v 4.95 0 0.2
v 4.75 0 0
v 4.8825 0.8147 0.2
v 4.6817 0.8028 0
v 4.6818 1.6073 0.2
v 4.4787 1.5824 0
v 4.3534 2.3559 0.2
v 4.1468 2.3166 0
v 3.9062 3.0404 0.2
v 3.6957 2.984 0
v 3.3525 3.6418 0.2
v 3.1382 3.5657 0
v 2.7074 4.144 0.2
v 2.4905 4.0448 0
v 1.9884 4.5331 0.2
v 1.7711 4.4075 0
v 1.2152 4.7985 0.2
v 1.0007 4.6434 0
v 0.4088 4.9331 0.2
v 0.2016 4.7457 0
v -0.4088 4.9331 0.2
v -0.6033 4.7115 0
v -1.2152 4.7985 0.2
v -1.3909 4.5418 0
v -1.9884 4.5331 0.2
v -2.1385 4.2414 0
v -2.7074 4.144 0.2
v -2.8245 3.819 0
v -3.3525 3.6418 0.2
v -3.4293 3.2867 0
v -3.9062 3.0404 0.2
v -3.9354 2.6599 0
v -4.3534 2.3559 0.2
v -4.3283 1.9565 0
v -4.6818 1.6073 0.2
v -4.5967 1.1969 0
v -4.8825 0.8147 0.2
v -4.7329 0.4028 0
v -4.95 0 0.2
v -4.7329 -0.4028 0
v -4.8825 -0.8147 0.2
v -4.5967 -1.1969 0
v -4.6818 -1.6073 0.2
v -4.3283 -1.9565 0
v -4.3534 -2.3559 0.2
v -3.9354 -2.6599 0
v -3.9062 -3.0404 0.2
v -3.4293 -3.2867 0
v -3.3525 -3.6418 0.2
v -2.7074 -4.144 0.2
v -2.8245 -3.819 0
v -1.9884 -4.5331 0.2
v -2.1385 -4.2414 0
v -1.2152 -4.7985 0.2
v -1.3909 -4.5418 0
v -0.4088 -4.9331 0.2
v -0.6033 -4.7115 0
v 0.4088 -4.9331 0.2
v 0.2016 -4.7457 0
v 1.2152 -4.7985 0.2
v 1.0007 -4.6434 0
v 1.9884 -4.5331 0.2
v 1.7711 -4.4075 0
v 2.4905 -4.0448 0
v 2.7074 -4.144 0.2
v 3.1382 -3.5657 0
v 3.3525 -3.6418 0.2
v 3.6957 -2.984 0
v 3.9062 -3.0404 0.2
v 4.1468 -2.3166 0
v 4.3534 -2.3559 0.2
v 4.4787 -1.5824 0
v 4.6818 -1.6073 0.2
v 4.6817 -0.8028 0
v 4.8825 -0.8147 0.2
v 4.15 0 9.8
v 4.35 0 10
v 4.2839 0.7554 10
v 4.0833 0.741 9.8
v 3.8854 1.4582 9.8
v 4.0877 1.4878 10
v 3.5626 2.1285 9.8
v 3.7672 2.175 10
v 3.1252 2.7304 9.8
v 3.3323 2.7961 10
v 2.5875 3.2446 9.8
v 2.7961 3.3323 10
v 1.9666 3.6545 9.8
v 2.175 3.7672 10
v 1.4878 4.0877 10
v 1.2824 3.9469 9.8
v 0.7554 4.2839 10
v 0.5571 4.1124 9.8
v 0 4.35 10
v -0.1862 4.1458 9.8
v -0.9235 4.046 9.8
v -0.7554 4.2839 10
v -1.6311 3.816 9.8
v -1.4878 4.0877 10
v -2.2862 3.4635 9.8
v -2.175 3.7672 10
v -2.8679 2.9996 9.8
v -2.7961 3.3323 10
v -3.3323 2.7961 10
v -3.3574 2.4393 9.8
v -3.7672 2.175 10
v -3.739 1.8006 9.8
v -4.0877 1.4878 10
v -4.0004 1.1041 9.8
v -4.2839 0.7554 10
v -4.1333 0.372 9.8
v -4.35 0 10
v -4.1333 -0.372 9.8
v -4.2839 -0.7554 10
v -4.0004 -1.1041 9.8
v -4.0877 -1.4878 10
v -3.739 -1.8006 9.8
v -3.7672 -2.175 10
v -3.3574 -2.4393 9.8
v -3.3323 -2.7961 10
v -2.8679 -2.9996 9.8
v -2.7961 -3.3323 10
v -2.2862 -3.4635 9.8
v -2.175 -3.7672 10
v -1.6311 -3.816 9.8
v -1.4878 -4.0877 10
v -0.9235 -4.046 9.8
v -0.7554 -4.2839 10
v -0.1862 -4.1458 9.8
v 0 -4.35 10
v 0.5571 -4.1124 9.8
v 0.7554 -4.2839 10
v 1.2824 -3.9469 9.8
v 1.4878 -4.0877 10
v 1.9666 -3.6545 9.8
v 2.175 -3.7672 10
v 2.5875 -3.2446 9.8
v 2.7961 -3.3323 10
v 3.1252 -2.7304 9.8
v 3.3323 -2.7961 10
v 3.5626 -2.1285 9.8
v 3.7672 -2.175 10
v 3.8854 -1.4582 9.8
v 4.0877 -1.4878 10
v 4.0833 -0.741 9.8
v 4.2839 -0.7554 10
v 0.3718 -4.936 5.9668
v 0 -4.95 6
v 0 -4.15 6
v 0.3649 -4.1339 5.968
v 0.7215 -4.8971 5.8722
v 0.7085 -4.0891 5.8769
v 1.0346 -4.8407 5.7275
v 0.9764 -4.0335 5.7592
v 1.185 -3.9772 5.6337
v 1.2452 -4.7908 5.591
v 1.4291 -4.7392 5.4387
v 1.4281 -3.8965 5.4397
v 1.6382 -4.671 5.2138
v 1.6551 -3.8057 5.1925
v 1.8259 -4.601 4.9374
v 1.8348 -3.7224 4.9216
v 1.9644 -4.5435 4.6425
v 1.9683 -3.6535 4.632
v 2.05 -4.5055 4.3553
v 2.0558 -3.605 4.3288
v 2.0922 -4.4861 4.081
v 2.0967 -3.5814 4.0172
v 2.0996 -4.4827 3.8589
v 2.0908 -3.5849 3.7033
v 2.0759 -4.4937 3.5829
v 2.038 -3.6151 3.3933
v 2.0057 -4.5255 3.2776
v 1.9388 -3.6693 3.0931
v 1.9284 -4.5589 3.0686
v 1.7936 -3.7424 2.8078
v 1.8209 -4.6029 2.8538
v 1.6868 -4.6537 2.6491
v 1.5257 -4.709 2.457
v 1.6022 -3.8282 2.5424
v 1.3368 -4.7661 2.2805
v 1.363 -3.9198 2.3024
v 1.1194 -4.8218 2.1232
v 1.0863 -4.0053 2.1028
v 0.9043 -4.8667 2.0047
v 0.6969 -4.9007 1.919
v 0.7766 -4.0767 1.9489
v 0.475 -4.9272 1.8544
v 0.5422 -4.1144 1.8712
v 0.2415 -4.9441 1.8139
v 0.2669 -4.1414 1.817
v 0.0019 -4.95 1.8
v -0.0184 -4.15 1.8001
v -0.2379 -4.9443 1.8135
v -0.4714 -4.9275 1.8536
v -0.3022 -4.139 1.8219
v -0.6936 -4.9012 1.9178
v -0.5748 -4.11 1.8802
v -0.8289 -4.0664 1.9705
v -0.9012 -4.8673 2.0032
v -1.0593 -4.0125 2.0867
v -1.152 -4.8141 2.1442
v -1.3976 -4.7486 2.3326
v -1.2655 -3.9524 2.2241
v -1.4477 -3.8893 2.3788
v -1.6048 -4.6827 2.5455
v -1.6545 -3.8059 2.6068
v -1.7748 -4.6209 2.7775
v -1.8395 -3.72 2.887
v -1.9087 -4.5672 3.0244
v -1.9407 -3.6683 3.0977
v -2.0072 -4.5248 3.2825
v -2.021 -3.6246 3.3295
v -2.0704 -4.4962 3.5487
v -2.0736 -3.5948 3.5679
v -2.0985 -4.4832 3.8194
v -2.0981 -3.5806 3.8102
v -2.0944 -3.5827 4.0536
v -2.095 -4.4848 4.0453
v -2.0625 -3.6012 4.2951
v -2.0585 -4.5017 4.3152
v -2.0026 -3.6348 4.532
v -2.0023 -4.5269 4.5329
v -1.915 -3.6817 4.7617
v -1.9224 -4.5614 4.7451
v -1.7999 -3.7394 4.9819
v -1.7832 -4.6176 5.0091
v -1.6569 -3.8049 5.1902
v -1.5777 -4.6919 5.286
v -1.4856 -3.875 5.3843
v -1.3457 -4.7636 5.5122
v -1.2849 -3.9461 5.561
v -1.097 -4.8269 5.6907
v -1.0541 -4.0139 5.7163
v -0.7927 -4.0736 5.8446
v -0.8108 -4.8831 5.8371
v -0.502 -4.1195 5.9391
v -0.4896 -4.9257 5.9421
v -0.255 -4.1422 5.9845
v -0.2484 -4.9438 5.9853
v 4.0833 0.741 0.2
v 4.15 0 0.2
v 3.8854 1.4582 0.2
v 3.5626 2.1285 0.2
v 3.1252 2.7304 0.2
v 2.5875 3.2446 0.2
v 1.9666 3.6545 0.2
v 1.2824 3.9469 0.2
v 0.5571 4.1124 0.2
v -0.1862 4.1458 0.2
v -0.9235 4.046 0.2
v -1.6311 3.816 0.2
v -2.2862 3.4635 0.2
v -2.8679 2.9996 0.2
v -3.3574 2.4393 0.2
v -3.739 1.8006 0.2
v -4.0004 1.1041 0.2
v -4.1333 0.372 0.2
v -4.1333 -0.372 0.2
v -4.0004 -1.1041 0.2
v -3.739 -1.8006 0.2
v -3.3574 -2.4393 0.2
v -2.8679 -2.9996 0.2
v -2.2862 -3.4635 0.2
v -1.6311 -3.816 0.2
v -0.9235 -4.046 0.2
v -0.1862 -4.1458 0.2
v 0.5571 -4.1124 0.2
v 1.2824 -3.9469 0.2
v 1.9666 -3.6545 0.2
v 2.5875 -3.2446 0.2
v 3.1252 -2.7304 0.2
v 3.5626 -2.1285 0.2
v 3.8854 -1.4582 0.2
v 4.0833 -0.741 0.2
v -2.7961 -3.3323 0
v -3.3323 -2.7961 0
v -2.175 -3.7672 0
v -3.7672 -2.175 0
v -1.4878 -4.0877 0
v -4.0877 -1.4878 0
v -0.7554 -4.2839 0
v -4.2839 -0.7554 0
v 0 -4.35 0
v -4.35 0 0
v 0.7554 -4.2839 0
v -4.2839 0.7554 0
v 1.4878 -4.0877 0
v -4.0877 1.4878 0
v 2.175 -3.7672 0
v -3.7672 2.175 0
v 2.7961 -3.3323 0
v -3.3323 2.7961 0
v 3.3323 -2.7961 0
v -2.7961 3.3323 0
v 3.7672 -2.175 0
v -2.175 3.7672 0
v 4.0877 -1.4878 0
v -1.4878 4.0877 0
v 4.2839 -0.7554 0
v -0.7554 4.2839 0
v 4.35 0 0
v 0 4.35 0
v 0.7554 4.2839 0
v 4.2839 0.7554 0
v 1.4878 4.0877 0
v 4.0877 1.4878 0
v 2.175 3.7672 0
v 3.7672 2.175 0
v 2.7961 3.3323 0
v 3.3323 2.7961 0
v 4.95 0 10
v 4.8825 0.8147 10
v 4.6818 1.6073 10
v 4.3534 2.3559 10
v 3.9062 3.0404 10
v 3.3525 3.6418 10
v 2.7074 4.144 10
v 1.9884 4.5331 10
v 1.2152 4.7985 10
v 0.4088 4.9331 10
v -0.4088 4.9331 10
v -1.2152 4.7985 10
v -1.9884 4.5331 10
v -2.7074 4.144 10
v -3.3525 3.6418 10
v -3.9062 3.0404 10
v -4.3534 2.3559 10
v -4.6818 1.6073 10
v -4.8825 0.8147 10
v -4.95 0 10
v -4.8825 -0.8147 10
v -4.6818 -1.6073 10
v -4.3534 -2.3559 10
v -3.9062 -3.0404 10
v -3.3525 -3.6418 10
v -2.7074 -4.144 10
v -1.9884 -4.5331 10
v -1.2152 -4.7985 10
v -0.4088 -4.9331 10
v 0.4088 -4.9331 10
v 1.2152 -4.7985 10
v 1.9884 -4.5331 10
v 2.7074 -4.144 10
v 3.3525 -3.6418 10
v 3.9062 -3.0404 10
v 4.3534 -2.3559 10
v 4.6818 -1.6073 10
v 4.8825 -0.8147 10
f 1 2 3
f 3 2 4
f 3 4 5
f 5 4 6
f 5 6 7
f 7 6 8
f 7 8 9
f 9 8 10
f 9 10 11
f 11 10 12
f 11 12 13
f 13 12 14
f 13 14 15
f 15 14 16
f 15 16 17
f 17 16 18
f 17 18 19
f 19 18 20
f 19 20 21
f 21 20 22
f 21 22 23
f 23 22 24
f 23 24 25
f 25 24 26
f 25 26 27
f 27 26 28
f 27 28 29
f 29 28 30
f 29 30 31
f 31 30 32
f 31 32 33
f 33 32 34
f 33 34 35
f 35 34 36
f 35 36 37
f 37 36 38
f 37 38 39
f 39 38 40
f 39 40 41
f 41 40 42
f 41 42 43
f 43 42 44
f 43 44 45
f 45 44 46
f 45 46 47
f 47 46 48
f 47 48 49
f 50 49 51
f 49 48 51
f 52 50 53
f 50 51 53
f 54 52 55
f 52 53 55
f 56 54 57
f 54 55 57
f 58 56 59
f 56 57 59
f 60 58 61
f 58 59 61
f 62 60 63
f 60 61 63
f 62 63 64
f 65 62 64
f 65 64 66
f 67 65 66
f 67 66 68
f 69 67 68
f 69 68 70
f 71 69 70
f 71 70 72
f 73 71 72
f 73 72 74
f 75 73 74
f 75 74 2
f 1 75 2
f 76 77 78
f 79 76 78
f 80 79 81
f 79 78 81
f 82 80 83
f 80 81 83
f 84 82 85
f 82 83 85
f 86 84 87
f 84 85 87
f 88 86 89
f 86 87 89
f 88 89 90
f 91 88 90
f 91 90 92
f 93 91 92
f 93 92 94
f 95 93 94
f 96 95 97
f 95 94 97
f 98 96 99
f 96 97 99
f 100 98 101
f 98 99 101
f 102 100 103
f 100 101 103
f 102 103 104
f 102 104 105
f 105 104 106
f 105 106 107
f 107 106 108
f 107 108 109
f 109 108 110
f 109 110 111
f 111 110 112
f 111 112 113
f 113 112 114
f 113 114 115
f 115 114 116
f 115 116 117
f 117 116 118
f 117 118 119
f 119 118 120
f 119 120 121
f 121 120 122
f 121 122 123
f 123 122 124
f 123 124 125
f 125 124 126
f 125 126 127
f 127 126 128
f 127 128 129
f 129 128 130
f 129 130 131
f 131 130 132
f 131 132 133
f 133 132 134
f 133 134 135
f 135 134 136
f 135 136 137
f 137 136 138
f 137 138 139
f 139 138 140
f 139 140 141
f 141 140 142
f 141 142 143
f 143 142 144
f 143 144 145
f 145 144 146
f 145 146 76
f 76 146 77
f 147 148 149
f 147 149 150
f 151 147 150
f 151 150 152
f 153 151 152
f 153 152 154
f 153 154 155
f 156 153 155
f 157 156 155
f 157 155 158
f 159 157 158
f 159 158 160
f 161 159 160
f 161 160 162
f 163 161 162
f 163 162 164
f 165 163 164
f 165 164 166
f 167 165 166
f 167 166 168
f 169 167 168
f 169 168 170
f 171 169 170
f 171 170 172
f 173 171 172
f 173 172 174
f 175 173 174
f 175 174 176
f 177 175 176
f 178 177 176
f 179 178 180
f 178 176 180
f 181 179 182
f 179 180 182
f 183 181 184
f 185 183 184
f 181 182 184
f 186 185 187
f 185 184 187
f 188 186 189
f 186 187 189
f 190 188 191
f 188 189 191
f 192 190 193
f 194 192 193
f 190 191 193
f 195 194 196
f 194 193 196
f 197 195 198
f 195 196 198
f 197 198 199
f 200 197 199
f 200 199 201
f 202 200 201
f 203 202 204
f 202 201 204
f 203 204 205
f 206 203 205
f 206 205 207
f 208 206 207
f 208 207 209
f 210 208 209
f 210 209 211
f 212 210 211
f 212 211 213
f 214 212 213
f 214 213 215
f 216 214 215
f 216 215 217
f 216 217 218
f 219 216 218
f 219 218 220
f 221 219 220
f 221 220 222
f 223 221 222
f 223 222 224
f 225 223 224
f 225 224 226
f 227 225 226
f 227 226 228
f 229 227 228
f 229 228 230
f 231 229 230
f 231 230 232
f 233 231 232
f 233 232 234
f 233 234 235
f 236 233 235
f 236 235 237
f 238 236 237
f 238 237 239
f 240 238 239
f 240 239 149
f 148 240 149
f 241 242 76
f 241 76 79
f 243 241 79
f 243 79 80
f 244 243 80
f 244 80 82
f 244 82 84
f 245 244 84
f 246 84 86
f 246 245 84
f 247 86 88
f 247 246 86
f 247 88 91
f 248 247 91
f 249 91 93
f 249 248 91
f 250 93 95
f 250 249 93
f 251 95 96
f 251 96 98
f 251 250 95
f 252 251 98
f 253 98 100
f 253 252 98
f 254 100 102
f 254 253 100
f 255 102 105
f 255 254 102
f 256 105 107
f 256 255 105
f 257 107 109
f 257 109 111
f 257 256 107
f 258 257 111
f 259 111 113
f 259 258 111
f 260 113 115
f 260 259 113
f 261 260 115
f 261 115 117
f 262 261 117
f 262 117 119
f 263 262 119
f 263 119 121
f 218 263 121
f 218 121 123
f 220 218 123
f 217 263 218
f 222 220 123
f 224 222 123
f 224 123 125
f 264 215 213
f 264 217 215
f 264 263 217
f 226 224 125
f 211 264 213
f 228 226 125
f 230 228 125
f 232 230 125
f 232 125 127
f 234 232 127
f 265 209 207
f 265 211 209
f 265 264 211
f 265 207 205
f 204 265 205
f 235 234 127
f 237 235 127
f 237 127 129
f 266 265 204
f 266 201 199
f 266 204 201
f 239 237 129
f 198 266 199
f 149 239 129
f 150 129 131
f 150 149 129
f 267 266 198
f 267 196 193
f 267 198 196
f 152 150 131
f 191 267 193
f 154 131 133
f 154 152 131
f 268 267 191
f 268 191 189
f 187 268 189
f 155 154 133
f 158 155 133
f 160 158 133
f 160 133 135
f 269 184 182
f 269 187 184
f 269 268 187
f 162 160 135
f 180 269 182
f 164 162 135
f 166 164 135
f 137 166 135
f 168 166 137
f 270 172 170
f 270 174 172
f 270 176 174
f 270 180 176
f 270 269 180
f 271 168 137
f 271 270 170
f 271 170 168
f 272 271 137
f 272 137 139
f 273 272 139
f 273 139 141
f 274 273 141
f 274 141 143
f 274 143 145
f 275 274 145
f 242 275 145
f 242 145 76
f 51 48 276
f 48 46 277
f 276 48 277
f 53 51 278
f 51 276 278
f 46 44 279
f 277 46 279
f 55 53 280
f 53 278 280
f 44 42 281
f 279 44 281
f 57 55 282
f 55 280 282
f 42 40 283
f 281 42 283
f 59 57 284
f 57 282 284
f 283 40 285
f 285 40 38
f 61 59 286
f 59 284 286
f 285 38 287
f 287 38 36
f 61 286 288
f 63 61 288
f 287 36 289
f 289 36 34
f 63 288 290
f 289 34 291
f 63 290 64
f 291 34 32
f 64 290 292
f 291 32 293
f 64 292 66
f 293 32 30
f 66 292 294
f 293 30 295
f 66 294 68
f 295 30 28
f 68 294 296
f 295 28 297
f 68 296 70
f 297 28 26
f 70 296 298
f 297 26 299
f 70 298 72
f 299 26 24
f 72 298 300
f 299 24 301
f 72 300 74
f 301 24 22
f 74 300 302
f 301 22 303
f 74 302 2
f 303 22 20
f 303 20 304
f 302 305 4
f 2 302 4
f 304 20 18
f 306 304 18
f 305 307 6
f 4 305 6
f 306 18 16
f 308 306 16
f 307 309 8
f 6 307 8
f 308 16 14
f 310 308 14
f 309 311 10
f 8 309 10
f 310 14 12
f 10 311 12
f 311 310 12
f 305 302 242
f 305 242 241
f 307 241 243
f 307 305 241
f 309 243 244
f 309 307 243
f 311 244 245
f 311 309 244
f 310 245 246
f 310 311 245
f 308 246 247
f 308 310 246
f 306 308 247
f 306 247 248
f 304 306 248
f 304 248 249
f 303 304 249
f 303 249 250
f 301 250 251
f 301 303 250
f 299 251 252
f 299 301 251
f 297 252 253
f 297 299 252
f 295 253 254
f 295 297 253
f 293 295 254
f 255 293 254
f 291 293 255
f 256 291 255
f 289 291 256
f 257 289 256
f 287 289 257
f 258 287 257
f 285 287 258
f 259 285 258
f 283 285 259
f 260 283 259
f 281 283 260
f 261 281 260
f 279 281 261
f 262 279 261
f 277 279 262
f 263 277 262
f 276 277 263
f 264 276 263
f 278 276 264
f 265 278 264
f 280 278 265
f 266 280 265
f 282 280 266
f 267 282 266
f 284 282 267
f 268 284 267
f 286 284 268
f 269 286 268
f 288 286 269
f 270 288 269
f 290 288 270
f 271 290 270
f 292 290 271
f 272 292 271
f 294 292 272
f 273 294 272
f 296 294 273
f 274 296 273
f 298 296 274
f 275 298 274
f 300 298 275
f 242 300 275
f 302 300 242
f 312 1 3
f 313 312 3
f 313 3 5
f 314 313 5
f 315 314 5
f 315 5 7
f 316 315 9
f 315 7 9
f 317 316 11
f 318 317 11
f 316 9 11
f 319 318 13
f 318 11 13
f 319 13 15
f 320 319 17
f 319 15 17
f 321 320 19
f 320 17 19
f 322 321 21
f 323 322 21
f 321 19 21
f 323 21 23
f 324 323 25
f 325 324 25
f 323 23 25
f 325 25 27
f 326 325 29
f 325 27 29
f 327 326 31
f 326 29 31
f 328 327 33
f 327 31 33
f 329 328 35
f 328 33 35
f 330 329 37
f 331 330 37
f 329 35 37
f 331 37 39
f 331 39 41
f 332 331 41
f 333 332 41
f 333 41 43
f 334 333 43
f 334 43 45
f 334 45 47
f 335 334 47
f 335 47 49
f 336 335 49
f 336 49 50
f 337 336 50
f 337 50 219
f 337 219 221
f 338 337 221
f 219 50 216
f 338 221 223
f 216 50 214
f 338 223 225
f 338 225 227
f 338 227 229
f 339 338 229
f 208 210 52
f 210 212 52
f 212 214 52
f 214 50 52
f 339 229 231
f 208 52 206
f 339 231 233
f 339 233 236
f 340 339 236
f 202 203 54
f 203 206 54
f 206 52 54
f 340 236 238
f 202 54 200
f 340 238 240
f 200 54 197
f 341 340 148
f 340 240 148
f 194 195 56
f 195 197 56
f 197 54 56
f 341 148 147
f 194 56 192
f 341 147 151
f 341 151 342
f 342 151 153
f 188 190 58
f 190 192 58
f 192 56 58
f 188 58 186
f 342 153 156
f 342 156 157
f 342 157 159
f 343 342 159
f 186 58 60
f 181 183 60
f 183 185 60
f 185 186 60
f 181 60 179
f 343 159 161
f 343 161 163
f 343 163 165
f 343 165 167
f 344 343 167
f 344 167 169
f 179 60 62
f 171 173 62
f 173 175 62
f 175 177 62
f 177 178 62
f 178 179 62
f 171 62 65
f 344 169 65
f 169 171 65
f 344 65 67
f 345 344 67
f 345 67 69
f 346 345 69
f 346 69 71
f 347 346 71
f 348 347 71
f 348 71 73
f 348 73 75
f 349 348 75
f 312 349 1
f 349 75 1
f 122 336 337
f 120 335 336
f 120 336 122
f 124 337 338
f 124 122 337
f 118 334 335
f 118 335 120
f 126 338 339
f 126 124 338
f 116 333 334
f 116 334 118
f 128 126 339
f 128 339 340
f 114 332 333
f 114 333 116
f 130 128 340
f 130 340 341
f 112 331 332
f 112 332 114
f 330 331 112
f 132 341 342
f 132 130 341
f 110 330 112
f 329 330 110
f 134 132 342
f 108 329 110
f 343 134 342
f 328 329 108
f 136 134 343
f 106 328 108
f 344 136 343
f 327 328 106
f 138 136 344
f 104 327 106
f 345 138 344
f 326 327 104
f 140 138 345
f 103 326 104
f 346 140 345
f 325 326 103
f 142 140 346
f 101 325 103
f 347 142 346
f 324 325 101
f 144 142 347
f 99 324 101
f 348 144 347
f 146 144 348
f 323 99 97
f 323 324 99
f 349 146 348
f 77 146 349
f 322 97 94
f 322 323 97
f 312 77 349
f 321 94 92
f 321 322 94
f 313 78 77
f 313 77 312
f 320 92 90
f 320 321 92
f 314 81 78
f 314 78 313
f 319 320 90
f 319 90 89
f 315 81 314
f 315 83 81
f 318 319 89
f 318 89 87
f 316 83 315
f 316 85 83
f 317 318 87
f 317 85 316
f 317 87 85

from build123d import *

# Parameters (mm, degrees)
SKETCH1_R           = 4.95
SKETCH1_R_2         = 4.15
BOSS_EXTRUDE1_DEPTH = 10
CHAMFER1_SIZE       = 0.2
SKETCH2_R           = 2.1
CUT_EXTRUDE1_DEPTH  = 13.206760422


with BuildPart() as part:
    # Sketch1 → Boss-Extrude1 (new body)
    with BuildSketch(Plane.XY):
        Circle(SKETCH1_R)
        Circle(SKETCH1_R_2, mode=Mode.SUBTRACT)
    extrude(amount=BOSS_EXTRUDE1_DEPTH)

    # Chamfer1
    chamfer1_edges = [part.edges().sort_by_distance(p)[0] for p in [
        (-4.95, 0, 0),
        (-4.15, 0, 0),
        (-4.15, 0, 10),
    ]]
    chamfer(chamfer1_edges, length=CHAMFER1_SIZE)

    # Sketch2 → Cut-Extrude1 (cut, through all)
    with BuildSketch(Plane(origin=(0, 0, 0), x_dir=(1, 0, 0), z_dir=(0, 1, 0))):
        with Locations(Location((0, -3.9, 0), (0, 0, 270))):
            Circle(SKETCH2_R)
    extrude(amount=-CUT_EXTRUDE1_DEPTH, mode=Mode.SUBTRACT)


solid = part.part
